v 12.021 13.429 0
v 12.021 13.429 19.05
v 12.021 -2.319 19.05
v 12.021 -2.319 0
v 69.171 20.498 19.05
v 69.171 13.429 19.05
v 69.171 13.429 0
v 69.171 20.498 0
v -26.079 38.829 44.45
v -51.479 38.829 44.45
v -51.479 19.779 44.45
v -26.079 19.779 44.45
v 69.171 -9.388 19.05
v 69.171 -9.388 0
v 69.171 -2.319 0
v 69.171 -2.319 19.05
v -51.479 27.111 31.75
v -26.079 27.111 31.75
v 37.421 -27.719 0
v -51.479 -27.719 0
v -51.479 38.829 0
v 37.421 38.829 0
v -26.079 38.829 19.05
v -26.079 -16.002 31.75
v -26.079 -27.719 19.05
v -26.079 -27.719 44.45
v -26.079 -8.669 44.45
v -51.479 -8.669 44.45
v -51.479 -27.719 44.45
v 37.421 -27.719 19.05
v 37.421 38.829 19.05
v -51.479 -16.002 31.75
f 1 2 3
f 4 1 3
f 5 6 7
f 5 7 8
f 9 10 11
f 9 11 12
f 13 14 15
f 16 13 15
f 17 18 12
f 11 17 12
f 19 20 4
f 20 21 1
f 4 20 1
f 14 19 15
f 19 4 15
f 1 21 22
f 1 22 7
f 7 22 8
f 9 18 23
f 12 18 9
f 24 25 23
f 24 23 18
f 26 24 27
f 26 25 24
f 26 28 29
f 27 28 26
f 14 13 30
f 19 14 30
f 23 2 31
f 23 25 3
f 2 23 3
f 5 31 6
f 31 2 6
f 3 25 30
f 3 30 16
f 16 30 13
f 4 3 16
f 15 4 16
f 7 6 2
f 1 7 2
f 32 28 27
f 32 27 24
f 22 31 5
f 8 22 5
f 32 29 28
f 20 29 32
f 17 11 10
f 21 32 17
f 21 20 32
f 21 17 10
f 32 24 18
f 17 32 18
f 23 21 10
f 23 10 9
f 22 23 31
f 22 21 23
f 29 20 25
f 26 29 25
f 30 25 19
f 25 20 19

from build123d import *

# Parameters (mm, degrees)
F0_W     = 120.65
F0_H     = 66.548
F1_DEPTH = 44.45
F2_W     = 95.25
F2_H     = 25.4
F3_DEPTH = 182.372
F5_DEPTH = 80.518
F7_DEPTH = 103.632
F9_DEPTH = 44.196


with BuildPart() as f1:
    # F0 (on Top) → F1 (new body)
    with BuildSketch(Plane.XY):
        with Locations((8.846484, 5.5548)):
            Rectangle(F0_W, F0_H)
    extrude(amount=F1_DEPTH)

    # F2 (on face) → F3 (cut)
    with BuildSketch(Plane.XZ.offset(27.7192)):
        with Locations((21.546484, 31.75)):
            Rectangle(F2_W, F2_H)
    extrude(amount=-F3_DEPTH, mode=Mode.SUBTRACT)

    # F4 (on face) → F5 (cut)
    with BuildSketch(Plane.XY.offset(19.05)):
        Polygon((69.171484, 5.5548), (69.171484, 13.4288), (12.021484, 13.4288), (12.021484, 5.5548), (12.021484, -2.3192), (69.171484, -2.3192), align=None)
    extrude(amount=-F5_DEPTH, mode=Mode.SUBTRACT)

    # F6 (on face) → F7 (cut)
    with BuildSketch(Plane.YZ.offset(-26.078516)):
        Polygon((5.5548, 44.45), (-8.6692, 44.45), (-16.001548, 31.75), (-8.6692, 31.75), (5.5548, 31.75), (19.7788, 31.75), (27.111149, 31.75), (19.7788, 44.45), align=None)
    extrude(amount=-F7_DEPTH, mode=Mode.SUBTRACT)

    # F8 (on face) → F9 (cut)
    with BuildSketch(Plane.XY.offset(19.05)):
        Polygon((37.421484, -27.7192), (69.171484, -27.7192), (69.171484, -9.388329), align=None)
        Polygon((69.171484, 20.497929), (69.171484, 38.8288), (37.421484, 38.8288), align=None)
    extrude(amount=-F9_DEPTH, mode=Mode.SUBTRACT)


solid = f1.part
